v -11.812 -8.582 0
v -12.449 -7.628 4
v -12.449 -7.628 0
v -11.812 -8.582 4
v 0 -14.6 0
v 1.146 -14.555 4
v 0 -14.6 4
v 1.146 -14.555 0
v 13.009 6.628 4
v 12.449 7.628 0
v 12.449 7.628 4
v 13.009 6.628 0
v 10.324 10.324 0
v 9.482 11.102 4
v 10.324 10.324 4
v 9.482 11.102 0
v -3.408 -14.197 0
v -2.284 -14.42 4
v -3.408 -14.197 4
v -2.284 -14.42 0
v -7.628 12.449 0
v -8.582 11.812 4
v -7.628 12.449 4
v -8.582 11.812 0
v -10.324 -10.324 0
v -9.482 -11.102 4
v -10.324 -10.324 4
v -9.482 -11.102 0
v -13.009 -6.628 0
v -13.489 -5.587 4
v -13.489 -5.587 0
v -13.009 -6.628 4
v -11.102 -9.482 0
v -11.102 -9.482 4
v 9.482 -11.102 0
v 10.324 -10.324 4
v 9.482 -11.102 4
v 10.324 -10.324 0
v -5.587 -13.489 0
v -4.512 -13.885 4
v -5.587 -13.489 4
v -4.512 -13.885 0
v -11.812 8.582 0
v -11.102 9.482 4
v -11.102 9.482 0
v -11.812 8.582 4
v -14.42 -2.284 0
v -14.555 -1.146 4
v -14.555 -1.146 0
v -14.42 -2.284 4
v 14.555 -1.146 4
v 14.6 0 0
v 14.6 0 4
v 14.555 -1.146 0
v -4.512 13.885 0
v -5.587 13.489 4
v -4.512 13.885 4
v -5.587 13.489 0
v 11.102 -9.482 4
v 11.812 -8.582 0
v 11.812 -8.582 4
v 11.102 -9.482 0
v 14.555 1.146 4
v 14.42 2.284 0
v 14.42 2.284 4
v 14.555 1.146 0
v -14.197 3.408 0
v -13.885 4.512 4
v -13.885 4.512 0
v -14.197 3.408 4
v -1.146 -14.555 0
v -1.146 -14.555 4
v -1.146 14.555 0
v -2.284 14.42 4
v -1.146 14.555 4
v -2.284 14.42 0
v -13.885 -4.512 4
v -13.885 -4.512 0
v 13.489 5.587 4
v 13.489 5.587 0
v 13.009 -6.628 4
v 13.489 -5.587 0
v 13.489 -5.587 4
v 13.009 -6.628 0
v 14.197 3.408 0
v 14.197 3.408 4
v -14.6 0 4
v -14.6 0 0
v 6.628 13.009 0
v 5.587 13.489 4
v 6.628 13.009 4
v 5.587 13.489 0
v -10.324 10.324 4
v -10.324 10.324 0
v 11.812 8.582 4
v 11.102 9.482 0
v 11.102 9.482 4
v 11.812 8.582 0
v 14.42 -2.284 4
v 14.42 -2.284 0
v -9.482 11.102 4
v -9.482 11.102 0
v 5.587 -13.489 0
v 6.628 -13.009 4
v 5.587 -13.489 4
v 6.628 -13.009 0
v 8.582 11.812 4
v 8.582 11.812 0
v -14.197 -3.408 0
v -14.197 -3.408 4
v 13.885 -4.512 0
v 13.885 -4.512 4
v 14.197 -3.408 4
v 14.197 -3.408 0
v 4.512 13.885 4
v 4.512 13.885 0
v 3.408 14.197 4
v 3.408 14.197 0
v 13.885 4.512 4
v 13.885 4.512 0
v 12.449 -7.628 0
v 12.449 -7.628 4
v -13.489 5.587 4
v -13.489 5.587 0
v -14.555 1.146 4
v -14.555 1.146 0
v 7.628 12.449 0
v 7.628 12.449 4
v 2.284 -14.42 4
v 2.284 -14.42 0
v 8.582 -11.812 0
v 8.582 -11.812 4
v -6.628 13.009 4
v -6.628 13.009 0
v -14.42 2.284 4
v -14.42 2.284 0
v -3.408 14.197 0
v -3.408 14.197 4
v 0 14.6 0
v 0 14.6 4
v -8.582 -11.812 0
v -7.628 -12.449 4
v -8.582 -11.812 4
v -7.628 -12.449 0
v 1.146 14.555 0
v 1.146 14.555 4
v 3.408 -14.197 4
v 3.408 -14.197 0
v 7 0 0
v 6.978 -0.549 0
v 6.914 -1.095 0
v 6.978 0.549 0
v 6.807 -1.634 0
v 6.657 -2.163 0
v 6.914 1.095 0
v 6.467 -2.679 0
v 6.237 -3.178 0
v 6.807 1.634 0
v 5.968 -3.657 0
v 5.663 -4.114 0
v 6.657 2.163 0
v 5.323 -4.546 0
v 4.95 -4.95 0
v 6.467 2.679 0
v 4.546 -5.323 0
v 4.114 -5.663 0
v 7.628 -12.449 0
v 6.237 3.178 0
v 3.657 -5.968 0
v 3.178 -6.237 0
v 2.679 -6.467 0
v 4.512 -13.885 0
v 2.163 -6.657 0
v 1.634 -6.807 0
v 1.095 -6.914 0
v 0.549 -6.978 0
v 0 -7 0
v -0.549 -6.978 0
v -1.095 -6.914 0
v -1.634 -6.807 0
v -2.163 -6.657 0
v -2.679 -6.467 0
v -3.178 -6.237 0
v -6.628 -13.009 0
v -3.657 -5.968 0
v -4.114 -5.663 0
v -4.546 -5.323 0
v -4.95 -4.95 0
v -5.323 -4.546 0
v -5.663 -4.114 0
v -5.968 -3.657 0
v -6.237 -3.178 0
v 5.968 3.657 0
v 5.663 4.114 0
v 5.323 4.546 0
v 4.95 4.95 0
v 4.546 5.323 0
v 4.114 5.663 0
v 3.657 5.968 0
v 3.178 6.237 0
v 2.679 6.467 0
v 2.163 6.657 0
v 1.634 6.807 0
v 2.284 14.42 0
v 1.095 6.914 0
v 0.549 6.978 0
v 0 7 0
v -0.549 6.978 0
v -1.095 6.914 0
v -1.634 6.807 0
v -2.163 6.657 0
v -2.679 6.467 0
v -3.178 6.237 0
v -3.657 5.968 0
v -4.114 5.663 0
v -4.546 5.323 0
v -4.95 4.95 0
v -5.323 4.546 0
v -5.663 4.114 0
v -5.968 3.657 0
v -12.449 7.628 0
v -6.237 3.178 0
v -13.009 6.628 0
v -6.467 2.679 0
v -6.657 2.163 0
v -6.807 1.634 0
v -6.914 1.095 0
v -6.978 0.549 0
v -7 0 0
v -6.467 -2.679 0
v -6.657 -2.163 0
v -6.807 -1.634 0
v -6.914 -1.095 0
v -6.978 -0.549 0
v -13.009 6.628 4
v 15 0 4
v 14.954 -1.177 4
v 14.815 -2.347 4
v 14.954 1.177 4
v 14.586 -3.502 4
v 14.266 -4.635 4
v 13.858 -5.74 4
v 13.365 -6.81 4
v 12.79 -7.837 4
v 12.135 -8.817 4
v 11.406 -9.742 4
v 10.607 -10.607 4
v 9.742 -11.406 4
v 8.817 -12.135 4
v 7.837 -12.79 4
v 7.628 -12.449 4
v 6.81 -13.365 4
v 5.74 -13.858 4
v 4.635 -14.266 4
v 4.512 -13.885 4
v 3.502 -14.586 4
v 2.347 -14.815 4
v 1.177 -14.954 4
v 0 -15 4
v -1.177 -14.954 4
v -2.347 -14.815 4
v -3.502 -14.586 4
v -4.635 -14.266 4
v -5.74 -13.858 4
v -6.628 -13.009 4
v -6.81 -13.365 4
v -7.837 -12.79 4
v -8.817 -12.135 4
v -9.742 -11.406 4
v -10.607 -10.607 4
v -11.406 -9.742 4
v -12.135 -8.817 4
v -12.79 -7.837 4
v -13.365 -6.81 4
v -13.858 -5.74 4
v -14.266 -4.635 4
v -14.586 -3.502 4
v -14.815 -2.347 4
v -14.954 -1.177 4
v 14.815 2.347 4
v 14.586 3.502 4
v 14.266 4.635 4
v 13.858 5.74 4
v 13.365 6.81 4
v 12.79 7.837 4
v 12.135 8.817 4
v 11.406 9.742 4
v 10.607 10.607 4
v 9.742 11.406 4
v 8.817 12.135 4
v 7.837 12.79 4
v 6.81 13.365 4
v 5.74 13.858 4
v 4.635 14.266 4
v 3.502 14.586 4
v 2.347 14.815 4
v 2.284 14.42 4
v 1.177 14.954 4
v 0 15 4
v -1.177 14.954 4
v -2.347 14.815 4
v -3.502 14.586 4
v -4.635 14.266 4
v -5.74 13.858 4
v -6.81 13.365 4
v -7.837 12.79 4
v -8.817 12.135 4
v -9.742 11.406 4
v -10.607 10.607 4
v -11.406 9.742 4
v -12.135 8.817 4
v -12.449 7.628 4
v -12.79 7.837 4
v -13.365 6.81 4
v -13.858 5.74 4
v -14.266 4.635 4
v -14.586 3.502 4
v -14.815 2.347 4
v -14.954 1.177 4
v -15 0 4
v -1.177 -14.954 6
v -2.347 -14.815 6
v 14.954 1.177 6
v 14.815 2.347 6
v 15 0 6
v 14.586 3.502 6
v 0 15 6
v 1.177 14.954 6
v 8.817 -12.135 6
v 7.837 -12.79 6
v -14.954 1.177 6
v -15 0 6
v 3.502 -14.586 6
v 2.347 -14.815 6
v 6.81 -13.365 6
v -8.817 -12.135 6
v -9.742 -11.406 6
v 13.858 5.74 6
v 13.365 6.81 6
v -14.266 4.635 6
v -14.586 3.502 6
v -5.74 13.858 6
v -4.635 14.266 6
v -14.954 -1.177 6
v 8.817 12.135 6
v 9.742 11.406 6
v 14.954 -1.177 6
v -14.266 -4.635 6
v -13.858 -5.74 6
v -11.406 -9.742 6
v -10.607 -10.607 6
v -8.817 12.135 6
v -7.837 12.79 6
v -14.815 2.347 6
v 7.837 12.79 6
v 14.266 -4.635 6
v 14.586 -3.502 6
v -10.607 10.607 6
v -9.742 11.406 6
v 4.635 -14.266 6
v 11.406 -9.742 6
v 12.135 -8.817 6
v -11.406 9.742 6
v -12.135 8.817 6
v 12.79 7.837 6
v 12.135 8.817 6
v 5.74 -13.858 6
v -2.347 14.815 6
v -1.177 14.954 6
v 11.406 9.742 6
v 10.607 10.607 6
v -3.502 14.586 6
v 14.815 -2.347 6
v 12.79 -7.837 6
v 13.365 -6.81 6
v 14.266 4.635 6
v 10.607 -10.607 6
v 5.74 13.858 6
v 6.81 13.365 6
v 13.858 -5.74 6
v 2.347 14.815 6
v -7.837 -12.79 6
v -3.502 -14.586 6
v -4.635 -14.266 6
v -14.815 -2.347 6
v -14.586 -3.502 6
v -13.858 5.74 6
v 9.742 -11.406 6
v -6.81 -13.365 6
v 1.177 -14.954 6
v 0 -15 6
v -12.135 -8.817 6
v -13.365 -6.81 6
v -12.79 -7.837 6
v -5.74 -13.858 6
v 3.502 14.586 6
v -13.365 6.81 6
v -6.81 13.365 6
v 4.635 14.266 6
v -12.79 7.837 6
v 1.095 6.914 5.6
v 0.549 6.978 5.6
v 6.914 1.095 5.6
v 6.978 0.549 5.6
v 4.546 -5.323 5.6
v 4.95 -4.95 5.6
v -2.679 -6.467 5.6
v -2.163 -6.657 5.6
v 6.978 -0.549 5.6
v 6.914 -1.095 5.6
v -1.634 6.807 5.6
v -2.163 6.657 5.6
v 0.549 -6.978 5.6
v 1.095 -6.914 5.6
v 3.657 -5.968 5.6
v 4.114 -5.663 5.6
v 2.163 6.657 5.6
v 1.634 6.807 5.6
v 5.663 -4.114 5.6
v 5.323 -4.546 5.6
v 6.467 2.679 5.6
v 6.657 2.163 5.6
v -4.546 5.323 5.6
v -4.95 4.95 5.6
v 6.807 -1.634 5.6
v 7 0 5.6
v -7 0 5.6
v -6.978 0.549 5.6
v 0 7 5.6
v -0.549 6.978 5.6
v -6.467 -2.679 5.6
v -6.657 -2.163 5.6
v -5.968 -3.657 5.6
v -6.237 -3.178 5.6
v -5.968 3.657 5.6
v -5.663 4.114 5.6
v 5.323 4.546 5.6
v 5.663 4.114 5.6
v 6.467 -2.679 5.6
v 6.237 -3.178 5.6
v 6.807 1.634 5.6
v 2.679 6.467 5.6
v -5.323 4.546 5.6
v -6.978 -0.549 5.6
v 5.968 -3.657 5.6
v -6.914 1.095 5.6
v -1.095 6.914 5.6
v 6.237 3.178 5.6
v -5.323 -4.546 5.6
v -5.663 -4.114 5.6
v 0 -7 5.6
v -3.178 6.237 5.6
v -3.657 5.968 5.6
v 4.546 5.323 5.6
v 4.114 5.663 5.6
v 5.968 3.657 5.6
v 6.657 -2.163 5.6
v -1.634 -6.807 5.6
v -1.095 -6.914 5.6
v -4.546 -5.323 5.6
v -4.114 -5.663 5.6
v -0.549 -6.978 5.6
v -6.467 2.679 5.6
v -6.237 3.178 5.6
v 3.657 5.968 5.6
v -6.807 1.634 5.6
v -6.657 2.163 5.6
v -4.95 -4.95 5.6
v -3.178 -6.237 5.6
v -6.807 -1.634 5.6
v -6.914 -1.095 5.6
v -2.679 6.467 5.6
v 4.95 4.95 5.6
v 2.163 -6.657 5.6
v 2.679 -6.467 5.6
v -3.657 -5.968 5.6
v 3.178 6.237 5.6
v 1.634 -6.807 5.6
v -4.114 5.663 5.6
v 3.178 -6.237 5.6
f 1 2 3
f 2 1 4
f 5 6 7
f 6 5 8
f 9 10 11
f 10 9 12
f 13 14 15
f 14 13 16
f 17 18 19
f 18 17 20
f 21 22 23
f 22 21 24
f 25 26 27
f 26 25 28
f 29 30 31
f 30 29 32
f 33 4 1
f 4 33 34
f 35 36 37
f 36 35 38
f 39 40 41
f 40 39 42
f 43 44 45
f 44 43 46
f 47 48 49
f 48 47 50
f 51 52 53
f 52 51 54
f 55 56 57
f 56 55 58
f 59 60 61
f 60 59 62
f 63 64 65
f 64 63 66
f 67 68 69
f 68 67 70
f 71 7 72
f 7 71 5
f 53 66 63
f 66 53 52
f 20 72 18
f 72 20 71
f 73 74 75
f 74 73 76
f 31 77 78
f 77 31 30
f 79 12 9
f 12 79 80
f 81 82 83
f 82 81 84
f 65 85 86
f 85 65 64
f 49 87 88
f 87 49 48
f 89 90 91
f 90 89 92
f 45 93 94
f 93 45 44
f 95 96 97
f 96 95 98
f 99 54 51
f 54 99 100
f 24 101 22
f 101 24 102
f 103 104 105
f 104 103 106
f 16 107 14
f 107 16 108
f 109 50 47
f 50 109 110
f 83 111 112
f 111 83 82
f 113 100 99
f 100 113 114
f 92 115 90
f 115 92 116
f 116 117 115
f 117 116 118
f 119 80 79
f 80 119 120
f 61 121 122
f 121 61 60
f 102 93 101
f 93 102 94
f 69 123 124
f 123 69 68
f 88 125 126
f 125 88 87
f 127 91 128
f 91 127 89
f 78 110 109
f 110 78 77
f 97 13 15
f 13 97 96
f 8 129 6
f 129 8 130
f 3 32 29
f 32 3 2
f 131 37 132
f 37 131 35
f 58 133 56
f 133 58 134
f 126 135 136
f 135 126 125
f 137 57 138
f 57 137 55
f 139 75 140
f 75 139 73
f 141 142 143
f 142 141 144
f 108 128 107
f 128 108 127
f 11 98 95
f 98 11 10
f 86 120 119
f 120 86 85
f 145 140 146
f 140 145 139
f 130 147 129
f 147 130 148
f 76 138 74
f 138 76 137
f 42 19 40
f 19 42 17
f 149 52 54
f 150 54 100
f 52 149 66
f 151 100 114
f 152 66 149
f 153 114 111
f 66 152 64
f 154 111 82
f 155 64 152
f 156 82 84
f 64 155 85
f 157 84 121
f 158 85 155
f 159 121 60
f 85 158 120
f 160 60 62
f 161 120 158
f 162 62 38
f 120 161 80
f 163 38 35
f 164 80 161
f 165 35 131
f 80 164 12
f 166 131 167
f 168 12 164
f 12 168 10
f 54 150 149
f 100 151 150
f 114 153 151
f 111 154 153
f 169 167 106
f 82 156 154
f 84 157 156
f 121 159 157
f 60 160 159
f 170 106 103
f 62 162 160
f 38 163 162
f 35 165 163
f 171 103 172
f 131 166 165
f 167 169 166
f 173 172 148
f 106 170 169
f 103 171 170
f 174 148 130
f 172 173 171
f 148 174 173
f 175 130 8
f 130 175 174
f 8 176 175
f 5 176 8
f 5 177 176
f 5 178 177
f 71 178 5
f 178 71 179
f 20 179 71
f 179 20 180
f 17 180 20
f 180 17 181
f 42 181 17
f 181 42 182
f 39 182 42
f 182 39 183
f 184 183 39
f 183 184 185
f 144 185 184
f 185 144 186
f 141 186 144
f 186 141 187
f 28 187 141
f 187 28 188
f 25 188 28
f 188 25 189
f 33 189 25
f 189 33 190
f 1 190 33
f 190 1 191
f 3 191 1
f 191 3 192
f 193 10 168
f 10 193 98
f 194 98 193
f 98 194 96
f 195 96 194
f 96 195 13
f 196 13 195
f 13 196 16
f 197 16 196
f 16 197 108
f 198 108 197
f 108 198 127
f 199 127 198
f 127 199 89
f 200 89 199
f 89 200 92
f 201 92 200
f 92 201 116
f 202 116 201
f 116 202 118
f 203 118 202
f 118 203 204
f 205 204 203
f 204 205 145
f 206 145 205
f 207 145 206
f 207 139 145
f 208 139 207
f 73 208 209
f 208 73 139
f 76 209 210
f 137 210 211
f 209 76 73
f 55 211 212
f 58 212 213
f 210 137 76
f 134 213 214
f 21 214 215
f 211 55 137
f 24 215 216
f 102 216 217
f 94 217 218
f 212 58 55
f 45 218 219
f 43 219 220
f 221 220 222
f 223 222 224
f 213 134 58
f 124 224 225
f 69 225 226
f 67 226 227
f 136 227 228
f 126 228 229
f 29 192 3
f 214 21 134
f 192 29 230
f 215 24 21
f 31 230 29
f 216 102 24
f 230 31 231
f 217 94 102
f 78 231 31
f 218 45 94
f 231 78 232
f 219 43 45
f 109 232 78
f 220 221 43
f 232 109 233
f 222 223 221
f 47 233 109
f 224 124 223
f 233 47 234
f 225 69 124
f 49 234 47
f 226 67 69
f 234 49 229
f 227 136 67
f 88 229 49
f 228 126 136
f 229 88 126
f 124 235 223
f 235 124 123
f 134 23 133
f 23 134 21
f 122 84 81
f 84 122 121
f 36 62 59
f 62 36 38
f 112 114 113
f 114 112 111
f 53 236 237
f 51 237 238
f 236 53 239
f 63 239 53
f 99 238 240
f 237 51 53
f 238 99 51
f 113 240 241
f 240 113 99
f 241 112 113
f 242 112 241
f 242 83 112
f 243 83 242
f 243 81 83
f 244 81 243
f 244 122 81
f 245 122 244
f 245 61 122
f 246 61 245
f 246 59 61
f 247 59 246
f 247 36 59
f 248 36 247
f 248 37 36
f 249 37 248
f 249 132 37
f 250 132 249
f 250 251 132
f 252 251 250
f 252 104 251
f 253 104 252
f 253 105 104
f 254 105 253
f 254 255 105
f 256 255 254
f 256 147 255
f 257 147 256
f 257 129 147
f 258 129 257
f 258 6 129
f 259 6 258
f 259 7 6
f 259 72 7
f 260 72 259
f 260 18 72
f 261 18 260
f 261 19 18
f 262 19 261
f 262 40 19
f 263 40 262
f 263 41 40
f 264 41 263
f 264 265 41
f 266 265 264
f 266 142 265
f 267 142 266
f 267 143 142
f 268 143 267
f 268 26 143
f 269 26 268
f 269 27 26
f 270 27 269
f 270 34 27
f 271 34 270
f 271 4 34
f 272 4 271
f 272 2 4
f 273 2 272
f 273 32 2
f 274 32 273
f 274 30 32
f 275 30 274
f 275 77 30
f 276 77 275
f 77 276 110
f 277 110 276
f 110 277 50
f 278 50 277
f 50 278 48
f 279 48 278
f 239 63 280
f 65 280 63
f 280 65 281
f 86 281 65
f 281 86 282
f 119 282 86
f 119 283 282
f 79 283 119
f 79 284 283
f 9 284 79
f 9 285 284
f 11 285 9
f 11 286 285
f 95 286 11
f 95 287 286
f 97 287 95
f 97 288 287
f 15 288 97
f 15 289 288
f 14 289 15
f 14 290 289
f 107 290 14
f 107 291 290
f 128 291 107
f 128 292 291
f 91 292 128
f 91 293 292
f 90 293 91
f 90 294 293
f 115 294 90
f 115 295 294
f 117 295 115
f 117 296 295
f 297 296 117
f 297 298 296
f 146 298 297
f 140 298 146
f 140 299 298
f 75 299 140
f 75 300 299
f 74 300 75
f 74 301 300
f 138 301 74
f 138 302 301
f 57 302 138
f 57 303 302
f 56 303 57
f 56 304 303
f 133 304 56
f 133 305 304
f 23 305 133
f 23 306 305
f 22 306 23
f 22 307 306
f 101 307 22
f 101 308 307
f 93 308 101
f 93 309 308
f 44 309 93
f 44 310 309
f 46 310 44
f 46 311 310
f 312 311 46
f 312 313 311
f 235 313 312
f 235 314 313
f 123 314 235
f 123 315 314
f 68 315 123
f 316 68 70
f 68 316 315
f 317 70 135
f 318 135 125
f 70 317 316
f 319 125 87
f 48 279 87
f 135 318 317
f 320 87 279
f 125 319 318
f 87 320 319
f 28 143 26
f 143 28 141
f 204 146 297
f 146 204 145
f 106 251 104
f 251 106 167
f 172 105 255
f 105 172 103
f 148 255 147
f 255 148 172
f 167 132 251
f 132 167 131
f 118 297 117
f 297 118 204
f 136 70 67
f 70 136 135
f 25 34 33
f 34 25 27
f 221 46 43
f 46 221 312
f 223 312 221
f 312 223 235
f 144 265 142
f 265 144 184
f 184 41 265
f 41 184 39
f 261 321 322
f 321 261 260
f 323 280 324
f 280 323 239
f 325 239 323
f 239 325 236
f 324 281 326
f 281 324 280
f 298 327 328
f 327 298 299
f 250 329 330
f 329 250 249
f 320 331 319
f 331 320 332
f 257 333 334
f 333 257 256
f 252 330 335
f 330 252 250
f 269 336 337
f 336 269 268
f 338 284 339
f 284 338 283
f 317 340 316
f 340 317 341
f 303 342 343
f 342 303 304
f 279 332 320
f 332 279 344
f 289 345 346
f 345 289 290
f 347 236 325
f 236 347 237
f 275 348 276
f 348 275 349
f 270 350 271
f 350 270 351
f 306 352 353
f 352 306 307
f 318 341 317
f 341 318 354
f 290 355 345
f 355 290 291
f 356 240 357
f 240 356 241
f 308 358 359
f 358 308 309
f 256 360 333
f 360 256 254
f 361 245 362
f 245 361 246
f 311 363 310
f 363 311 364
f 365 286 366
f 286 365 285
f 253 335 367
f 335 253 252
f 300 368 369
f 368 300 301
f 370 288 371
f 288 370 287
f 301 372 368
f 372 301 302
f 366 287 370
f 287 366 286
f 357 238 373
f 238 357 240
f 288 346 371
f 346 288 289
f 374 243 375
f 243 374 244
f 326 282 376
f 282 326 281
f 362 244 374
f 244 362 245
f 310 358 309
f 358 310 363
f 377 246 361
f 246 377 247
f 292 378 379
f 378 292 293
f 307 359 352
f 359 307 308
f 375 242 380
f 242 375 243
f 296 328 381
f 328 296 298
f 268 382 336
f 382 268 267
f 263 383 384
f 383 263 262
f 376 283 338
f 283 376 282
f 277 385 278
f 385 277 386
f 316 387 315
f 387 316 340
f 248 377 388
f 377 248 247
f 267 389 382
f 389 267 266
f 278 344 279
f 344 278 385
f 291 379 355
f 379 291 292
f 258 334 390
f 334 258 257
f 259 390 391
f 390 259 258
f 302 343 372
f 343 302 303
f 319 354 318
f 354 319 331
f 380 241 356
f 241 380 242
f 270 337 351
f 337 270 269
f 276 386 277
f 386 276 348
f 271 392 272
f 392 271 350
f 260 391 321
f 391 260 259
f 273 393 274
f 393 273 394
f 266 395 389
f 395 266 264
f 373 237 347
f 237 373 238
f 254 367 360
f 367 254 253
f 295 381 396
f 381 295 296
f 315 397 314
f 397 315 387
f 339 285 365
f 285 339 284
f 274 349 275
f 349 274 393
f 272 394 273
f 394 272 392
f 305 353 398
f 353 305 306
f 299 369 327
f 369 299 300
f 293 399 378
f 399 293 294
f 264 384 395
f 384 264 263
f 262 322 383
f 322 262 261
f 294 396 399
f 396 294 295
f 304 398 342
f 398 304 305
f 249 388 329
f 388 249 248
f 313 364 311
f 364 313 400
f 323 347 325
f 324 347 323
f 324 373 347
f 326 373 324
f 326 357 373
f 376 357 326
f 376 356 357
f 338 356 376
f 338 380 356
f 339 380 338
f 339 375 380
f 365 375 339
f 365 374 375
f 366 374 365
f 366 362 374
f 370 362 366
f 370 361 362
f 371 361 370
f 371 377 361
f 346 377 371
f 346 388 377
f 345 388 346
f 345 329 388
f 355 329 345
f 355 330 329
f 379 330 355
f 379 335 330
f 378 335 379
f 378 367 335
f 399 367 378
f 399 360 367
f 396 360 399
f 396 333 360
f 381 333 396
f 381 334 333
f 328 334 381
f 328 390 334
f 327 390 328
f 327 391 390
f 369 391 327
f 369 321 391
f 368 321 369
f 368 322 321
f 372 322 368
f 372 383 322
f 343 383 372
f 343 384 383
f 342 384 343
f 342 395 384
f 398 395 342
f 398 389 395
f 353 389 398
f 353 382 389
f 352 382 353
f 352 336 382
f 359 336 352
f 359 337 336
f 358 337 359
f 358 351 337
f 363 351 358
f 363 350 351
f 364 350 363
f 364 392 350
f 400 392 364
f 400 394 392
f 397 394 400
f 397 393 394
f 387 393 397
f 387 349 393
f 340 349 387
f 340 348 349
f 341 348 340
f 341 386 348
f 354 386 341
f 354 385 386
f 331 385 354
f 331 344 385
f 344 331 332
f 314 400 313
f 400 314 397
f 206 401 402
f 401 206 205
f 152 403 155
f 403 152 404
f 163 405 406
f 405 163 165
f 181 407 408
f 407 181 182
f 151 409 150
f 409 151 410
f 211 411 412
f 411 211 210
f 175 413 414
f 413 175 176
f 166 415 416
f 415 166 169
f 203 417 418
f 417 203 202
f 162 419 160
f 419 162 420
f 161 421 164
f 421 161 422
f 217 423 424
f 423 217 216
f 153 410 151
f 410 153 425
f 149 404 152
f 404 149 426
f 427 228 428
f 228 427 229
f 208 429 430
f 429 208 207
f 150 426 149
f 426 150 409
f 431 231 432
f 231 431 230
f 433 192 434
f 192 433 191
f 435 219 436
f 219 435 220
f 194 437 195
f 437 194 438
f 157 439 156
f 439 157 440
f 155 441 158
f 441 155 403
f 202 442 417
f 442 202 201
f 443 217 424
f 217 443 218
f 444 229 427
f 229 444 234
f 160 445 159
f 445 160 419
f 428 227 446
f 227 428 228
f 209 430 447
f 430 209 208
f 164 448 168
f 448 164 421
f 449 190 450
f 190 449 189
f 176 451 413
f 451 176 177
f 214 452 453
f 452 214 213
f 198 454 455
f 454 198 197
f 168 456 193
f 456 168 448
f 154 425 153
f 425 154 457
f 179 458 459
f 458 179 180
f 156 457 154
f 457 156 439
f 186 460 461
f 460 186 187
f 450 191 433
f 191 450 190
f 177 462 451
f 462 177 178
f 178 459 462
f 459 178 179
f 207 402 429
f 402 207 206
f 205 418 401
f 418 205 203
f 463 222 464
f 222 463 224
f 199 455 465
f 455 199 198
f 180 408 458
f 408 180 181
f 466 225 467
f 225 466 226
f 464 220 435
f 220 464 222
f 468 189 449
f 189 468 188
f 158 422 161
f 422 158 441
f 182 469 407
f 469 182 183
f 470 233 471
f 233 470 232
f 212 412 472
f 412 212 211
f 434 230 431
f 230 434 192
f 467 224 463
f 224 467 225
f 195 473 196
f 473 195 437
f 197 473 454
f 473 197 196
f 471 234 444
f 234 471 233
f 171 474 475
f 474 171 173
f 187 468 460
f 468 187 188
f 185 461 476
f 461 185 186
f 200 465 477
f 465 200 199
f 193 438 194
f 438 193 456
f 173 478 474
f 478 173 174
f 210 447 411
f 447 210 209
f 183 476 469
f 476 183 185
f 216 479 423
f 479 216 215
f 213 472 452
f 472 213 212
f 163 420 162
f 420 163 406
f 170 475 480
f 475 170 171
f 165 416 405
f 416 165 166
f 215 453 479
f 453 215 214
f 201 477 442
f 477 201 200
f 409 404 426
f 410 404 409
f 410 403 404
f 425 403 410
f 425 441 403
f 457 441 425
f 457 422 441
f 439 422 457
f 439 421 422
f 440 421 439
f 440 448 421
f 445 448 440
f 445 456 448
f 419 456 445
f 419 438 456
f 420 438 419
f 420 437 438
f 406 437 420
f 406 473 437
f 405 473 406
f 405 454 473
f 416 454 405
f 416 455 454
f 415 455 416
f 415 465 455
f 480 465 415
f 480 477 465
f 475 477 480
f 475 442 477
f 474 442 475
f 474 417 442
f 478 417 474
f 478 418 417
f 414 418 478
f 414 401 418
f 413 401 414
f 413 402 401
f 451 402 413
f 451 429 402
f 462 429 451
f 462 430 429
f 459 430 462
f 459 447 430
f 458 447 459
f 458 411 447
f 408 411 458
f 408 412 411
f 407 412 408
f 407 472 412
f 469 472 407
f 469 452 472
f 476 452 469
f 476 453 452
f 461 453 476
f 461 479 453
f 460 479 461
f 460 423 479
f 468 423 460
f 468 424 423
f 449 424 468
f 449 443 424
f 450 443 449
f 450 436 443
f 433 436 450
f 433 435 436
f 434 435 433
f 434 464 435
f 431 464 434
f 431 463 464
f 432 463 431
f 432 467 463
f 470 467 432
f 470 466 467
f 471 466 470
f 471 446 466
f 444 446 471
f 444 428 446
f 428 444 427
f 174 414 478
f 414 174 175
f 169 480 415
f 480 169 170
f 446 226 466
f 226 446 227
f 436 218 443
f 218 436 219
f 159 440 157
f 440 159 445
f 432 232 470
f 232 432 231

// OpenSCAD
//rinsing + waste vial

$fn=80;

//vial();
//translate([0, 0, 51-4]) vial_cap();
vial_cap();

module vial() {
    $fn=100;
    difference() {
        cylinder(d=30, h=51);
        translate([0, 0, 3]) cylinder(d=28, h=51);
    }
}

module vial_cap() {
    difference() {
        union() {
            translate([0, 0, 0]) cylinder(d=29.2, h=4);
            translate([0, 0, 4]) cylinder(d=30, h=2);
        }
        translate([0, 0, -1]) cylinder(d=14, h=6.6); //0.4 mm Membran
    }
}
